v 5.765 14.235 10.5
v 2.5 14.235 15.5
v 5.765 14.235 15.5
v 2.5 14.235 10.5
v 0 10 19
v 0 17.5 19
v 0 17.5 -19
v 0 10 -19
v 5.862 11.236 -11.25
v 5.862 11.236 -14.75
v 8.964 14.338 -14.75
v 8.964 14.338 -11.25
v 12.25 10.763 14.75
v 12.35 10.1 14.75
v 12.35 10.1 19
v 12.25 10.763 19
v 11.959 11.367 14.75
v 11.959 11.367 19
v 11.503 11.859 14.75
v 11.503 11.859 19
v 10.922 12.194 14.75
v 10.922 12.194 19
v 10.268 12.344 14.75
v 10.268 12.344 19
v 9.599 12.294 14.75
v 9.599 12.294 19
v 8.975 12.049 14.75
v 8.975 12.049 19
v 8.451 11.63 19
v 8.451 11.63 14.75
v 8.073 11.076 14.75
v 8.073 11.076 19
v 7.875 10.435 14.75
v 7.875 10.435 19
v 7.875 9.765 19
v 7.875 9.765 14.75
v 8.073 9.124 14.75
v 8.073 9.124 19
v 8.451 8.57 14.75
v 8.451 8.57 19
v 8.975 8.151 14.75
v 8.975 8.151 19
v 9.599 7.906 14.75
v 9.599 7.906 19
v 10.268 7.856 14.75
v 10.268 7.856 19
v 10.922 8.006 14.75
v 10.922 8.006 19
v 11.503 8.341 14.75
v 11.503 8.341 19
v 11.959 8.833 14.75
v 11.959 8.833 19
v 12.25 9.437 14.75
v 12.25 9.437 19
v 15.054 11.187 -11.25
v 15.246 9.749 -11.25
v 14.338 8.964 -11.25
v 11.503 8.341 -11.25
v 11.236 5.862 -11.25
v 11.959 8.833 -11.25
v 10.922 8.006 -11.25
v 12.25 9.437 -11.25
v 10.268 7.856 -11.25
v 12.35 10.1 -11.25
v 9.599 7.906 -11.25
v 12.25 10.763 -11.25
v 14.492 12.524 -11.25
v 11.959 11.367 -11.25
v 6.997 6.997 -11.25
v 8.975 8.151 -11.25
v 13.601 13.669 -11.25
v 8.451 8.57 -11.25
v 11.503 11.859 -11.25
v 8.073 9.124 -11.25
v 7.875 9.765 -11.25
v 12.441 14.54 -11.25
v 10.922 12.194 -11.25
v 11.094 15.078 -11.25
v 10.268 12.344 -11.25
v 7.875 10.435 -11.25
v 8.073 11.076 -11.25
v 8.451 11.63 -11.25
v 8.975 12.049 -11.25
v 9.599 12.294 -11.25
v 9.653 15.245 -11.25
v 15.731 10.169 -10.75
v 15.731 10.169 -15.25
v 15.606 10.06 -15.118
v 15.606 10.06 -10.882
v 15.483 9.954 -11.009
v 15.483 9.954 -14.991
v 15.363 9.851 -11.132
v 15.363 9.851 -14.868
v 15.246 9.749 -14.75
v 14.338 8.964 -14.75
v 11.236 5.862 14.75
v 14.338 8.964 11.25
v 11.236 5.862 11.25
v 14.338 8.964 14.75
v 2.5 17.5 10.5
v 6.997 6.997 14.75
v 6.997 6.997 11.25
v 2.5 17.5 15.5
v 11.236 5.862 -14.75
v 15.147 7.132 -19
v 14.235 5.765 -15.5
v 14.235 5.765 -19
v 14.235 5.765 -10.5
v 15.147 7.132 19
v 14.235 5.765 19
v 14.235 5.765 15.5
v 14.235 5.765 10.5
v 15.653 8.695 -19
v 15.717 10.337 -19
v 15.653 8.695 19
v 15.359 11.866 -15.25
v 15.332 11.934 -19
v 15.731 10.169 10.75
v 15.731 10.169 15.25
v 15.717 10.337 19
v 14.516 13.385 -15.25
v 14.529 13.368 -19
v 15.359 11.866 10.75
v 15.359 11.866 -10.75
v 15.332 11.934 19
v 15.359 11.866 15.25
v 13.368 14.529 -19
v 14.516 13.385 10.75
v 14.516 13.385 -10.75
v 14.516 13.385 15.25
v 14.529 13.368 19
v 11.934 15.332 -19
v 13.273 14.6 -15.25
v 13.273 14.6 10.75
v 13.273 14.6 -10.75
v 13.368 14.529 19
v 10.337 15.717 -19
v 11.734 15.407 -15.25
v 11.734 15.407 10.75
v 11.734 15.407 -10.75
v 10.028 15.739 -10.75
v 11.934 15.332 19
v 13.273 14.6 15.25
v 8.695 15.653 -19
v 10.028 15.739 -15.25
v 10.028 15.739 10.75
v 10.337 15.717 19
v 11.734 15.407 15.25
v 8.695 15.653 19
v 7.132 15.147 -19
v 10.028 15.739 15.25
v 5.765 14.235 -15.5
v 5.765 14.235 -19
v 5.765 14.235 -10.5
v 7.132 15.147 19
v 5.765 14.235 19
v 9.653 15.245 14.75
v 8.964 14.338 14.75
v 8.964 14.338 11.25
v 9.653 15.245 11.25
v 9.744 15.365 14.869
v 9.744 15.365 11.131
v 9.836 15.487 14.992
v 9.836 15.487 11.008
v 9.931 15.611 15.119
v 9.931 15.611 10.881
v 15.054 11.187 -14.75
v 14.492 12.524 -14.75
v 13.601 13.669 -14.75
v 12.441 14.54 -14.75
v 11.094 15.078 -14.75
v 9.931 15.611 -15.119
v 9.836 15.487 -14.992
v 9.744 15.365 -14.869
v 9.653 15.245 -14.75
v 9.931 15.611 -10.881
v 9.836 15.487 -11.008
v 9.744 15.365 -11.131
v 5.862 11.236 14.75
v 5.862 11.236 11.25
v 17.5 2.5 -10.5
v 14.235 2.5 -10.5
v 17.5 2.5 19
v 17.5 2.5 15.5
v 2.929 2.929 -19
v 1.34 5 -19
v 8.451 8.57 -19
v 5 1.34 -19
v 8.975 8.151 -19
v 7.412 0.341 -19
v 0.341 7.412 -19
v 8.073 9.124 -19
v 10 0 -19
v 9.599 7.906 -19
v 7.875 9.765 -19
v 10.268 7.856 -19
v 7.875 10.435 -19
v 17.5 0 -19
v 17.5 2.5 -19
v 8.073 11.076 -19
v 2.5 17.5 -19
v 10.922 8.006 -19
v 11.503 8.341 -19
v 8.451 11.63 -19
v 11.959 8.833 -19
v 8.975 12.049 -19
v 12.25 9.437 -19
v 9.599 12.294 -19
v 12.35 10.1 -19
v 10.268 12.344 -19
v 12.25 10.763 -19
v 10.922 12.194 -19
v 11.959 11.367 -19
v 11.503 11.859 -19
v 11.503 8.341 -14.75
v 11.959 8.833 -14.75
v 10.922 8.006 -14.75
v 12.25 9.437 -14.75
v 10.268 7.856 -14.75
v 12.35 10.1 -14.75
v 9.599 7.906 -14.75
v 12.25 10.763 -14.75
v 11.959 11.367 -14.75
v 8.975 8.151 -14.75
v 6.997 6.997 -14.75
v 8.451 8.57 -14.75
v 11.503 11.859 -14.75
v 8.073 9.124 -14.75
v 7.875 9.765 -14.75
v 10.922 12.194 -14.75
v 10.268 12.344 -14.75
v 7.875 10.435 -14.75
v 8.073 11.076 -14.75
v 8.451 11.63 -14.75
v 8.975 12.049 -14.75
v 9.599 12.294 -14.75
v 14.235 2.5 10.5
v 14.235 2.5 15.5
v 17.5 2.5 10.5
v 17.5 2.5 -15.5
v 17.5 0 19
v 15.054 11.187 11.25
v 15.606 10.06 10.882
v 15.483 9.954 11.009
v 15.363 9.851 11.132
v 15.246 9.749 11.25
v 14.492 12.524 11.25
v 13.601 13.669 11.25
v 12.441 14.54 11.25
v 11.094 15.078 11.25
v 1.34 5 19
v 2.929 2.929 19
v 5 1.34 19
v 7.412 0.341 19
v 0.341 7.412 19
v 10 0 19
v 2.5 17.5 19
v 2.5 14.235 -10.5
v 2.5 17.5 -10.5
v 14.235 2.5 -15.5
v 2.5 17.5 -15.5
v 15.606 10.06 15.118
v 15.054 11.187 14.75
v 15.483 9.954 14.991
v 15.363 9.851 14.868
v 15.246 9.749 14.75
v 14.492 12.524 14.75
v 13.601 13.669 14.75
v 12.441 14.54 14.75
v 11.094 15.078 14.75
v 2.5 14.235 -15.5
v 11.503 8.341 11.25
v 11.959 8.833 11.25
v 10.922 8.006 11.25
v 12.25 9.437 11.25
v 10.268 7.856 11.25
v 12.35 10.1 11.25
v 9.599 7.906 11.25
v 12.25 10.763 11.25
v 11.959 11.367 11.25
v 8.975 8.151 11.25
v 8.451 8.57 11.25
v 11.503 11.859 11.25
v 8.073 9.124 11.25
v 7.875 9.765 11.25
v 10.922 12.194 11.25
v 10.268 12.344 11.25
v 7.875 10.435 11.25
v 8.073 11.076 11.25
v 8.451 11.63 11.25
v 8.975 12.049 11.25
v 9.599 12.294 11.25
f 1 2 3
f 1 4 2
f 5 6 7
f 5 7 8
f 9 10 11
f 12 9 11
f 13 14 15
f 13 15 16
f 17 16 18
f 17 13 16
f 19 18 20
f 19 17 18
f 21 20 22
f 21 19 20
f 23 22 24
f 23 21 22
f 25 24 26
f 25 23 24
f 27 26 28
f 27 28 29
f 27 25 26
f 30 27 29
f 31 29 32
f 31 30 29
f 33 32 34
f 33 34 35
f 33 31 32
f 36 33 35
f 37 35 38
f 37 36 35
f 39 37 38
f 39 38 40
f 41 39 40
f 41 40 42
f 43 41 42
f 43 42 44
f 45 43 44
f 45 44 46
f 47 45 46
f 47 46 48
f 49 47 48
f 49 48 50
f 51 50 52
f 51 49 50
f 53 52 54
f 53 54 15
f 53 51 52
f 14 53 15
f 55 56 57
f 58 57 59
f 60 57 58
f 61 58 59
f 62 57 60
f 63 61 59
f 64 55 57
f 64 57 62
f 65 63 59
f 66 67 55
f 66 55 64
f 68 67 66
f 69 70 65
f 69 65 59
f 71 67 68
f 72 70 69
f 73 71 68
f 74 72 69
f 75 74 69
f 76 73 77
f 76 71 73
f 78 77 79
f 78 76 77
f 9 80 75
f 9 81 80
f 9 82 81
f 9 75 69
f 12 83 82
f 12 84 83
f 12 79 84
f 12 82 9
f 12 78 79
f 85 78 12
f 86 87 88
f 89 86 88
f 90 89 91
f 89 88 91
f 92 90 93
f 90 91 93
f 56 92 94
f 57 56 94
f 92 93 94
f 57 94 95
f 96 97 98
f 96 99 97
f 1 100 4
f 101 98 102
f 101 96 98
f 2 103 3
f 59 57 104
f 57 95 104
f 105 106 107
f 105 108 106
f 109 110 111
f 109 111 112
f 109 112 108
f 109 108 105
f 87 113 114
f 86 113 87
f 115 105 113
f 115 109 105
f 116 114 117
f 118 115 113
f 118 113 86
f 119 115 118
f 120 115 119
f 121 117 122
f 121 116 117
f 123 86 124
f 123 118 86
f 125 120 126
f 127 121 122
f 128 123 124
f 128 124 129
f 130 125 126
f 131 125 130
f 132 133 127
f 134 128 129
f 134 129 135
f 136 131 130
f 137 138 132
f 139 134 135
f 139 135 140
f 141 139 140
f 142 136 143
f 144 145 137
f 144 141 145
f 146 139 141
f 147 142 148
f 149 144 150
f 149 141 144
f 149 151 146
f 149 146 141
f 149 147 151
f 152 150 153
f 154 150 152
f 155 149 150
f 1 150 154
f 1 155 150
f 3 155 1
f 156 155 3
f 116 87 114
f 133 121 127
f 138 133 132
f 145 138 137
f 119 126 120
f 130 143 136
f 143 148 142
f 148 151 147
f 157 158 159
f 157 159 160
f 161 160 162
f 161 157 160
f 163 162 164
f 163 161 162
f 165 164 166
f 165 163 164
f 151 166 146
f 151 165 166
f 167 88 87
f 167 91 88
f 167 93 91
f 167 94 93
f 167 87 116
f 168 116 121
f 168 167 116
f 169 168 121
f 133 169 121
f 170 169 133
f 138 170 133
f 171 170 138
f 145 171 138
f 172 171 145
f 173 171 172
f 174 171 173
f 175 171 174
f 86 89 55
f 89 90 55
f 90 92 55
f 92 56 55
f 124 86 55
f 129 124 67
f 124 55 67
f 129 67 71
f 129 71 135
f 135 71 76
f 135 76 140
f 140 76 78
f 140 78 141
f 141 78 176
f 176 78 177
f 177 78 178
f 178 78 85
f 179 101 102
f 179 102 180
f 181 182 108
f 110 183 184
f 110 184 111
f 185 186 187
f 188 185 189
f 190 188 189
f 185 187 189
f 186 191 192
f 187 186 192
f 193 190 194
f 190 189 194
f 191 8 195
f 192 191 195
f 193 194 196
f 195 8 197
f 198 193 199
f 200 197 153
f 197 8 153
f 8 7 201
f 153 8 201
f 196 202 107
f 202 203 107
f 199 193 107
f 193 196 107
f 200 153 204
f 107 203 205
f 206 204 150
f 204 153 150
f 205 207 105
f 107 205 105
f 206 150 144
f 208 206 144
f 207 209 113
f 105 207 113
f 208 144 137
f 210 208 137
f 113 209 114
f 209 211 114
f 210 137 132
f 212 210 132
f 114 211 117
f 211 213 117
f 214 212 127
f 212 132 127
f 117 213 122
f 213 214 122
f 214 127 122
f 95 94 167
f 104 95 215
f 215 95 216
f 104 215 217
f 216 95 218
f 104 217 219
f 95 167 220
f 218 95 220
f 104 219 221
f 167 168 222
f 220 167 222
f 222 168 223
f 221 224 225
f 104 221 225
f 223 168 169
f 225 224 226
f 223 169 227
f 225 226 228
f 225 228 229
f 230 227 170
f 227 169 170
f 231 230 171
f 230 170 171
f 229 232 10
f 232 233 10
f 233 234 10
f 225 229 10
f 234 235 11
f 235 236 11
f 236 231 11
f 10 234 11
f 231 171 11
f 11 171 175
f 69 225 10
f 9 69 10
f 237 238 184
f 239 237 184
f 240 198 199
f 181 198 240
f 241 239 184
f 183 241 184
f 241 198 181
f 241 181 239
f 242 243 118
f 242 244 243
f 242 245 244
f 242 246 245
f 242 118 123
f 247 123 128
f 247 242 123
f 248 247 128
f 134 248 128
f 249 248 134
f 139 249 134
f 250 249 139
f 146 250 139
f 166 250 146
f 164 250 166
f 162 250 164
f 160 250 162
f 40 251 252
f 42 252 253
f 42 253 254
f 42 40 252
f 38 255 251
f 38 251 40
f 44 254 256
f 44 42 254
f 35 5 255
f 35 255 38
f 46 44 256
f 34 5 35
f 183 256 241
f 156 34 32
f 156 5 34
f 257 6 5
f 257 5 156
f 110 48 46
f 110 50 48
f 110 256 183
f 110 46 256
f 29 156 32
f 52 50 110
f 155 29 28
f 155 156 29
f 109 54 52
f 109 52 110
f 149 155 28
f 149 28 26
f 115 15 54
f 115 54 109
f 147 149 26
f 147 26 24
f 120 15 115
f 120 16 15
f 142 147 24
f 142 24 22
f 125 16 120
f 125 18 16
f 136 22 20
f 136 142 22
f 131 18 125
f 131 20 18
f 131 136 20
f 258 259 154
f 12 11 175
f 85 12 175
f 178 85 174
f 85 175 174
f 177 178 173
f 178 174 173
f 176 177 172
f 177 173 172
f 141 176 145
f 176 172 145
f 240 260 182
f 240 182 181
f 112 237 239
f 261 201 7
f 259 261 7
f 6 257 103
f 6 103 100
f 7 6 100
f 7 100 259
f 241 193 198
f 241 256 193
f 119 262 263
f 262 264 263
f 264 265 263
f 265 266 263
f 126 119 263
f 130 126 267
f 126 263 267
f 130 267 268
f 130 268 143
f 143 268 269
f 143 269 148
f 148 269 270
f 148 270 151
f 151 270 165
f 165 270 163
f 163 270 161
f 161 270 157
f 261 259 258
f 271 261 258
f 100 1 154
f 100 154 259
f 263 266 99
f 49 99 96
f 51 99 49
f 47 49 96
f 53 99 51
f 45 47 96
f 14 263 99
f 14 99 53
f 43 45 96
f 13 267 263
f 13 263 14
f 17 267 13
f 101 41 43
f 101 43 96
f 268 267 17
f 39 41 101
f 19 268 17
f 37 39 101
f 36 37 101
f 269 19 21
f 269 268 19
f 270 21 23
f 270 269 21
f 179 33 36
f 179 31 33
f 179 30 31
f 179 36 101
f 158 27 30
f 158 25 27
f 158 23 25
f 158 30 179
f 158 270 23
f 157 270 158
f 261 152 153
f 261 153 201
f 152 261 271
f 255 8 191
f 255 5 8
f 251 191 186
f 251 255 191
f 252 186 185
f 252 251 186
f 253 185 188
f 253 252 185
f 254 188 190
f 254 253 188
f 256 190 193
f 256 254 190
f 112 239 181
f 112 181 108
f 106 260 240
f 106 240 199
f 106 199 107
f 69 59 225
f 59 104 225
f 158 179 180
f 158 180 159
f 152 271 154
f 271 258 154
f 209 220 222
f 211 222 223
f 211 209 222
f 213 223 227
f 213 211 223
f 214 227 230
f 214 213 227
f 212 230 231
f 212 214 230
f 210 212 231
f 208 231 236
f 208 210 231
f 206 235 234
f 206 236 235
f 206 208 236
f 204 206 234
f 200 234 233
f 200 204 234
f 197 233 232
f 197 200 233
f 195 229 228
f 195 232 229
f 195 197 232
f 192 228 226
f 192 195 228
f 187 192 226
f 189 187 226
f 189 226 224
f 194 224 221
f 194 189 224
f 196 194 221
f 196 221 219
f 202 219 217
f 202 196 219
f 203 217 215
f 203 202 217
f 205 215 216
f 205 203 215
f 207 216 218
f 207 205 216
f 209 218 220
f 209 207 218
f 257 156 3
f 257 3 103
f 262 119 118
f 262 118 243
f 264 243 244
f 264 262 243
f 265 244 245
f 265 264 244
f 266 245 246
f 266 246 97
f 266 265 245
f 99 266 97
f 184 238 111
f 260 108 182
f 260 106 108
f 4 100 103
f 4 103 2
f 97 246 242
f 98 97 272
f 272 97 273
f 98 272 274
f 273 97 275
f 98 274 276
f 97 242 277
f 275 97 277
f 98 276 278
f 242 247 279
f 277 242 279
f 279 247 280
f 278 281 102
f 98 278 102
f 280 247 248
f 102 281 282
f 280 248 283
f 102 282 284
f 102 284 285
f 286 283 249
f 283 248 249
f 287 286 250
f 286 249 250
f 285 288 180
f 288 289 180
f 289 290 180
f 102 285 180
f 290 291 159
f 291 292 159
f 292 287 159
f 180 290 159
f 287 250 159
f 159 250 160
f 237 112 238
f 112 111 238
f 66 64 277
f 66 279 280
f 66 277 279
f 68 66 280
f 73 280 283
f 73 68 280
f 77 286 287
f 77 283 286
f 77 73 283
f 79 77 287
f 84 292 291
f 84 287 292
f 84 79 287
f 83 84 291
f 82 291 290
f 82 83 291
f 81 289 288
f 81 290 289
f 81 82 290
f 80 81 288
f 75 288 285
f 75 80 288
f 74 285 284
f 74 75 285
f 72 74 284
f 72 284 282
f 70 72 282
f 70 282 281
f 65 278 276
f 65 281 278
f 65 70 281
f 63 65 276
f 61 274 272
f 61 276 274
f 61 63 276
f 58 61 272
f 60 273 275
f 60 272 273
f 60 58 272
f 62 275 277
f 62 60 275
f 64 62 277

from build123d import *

# Parameters (mm, degrees)
SKETCH1_R                = 2.25
CORNER_DEPTH             = 19
NUT_START                = -6
NUT_DEPTH                = 1.75
CHAMFER1_SIZE            = 0.5
CUT_EXTRUDE1_START       = -6
CUT_EXTRUDE1_DEPTH       = 2.5
CHAMFER1_OF_MIRROR1_SIZE = 0.5


with BuildPart() as part:
    # Sketch1 → corner (new, symmetric)
    with BuildSketch(Plane.XY):
        with BuildLine():
            Line((17.5, 2.5), (14.235015678, 5.764984322))
            ThreePointArc((14.235015678, 5.764984322), (13.988392374, 13.988392374), (5.764984322, 14.235015678))
            Line((5.764984322, 14.235015678), (2.5, 17.5))
            Line((2.5, 17.5), (0, 17.5))
            Line((0, 17.5), (0, 10))
            ThreePointArc((0, 10), (2.928932188, 2.928932188), (10, 0))
            Line((10, 0), (17.5, 0))
            Line((17.5, 0), (17.5, 2.5))
        make_face()
        with Locations((10.1, 10.1)):
            Circle(SKETCH1_R, mode=Mode.SUBTRACT)
    extrude(amount=CORNER_DEPTH, both=True)

    # Sketch4 → nut (cut, symmetric)
    with BuildSketch(Plane.XY.offset(19).offset(NUT_START)):
        Polygon((8.964337735, 14.338349272), (12.289329799, 18.716832073), (18.544552679, 12.601797863), (14.338349272, 8.964337735), (11.235662265, 5.861650728), (6.997312992, 6.997312992), (5.861650728, 11.235662265), align=None)
    nut = extrude(amount=NUT_DEPTH, both=True, mode=Mode.SUBTRACT)

    # Chamfer1
    chamfer1_edges = [part.edges().sort_by_distance(p)[0] for p in [
        (13.938348825, 14.037852483, 14.75),
        (13.938348825, 14.037852483, 11.25),
    ]]
    chamfer(chamfer1_edges, length=CHAMFER1_SIZE)

    # Sketch6 → Cut-Extrude1 (cut, symmetric)
    with BuildSketch(Plane.XY.offset(19).offset(CUT_EXTRUDE1_START)):
        Polygon((2.5, 17.5), (2.5, 14.235015678), (5.764984322, 14.235015678), align=None)
        Polygon((14.235015678, 5.764984322), (14.235015678, 2.5), (17.5, 2.5), align=None)
    cut_extrude1 = extrude(amount=CUT_EXTRUDE1_DEPTH, both=True, mode=Mode.SUBTRACT)

    # Mirror1: nut, Cut-Extrude1 across plane
    add(nut.mirror(Plane.XY), mode=Mode.SUBTRACT)
    add(cut_extrude1.mirror(Plane.XY), mode=Mode.SUBTRACT)

    # Chamfer1 of Mirror1
    chamfer1_of_mirror1_edges = [part.edges().sort_by_distance(p)[0] for p in [
        (13.938348825, 14.037852483, -14.75),
        (13.938348825, 14.037852483, -11.25),
    ]]
    chamfer(chamfer1_of_mirror1_edges, length=CHAMFER1_OF_MIRROR1_SIZE)


solid = part.part
